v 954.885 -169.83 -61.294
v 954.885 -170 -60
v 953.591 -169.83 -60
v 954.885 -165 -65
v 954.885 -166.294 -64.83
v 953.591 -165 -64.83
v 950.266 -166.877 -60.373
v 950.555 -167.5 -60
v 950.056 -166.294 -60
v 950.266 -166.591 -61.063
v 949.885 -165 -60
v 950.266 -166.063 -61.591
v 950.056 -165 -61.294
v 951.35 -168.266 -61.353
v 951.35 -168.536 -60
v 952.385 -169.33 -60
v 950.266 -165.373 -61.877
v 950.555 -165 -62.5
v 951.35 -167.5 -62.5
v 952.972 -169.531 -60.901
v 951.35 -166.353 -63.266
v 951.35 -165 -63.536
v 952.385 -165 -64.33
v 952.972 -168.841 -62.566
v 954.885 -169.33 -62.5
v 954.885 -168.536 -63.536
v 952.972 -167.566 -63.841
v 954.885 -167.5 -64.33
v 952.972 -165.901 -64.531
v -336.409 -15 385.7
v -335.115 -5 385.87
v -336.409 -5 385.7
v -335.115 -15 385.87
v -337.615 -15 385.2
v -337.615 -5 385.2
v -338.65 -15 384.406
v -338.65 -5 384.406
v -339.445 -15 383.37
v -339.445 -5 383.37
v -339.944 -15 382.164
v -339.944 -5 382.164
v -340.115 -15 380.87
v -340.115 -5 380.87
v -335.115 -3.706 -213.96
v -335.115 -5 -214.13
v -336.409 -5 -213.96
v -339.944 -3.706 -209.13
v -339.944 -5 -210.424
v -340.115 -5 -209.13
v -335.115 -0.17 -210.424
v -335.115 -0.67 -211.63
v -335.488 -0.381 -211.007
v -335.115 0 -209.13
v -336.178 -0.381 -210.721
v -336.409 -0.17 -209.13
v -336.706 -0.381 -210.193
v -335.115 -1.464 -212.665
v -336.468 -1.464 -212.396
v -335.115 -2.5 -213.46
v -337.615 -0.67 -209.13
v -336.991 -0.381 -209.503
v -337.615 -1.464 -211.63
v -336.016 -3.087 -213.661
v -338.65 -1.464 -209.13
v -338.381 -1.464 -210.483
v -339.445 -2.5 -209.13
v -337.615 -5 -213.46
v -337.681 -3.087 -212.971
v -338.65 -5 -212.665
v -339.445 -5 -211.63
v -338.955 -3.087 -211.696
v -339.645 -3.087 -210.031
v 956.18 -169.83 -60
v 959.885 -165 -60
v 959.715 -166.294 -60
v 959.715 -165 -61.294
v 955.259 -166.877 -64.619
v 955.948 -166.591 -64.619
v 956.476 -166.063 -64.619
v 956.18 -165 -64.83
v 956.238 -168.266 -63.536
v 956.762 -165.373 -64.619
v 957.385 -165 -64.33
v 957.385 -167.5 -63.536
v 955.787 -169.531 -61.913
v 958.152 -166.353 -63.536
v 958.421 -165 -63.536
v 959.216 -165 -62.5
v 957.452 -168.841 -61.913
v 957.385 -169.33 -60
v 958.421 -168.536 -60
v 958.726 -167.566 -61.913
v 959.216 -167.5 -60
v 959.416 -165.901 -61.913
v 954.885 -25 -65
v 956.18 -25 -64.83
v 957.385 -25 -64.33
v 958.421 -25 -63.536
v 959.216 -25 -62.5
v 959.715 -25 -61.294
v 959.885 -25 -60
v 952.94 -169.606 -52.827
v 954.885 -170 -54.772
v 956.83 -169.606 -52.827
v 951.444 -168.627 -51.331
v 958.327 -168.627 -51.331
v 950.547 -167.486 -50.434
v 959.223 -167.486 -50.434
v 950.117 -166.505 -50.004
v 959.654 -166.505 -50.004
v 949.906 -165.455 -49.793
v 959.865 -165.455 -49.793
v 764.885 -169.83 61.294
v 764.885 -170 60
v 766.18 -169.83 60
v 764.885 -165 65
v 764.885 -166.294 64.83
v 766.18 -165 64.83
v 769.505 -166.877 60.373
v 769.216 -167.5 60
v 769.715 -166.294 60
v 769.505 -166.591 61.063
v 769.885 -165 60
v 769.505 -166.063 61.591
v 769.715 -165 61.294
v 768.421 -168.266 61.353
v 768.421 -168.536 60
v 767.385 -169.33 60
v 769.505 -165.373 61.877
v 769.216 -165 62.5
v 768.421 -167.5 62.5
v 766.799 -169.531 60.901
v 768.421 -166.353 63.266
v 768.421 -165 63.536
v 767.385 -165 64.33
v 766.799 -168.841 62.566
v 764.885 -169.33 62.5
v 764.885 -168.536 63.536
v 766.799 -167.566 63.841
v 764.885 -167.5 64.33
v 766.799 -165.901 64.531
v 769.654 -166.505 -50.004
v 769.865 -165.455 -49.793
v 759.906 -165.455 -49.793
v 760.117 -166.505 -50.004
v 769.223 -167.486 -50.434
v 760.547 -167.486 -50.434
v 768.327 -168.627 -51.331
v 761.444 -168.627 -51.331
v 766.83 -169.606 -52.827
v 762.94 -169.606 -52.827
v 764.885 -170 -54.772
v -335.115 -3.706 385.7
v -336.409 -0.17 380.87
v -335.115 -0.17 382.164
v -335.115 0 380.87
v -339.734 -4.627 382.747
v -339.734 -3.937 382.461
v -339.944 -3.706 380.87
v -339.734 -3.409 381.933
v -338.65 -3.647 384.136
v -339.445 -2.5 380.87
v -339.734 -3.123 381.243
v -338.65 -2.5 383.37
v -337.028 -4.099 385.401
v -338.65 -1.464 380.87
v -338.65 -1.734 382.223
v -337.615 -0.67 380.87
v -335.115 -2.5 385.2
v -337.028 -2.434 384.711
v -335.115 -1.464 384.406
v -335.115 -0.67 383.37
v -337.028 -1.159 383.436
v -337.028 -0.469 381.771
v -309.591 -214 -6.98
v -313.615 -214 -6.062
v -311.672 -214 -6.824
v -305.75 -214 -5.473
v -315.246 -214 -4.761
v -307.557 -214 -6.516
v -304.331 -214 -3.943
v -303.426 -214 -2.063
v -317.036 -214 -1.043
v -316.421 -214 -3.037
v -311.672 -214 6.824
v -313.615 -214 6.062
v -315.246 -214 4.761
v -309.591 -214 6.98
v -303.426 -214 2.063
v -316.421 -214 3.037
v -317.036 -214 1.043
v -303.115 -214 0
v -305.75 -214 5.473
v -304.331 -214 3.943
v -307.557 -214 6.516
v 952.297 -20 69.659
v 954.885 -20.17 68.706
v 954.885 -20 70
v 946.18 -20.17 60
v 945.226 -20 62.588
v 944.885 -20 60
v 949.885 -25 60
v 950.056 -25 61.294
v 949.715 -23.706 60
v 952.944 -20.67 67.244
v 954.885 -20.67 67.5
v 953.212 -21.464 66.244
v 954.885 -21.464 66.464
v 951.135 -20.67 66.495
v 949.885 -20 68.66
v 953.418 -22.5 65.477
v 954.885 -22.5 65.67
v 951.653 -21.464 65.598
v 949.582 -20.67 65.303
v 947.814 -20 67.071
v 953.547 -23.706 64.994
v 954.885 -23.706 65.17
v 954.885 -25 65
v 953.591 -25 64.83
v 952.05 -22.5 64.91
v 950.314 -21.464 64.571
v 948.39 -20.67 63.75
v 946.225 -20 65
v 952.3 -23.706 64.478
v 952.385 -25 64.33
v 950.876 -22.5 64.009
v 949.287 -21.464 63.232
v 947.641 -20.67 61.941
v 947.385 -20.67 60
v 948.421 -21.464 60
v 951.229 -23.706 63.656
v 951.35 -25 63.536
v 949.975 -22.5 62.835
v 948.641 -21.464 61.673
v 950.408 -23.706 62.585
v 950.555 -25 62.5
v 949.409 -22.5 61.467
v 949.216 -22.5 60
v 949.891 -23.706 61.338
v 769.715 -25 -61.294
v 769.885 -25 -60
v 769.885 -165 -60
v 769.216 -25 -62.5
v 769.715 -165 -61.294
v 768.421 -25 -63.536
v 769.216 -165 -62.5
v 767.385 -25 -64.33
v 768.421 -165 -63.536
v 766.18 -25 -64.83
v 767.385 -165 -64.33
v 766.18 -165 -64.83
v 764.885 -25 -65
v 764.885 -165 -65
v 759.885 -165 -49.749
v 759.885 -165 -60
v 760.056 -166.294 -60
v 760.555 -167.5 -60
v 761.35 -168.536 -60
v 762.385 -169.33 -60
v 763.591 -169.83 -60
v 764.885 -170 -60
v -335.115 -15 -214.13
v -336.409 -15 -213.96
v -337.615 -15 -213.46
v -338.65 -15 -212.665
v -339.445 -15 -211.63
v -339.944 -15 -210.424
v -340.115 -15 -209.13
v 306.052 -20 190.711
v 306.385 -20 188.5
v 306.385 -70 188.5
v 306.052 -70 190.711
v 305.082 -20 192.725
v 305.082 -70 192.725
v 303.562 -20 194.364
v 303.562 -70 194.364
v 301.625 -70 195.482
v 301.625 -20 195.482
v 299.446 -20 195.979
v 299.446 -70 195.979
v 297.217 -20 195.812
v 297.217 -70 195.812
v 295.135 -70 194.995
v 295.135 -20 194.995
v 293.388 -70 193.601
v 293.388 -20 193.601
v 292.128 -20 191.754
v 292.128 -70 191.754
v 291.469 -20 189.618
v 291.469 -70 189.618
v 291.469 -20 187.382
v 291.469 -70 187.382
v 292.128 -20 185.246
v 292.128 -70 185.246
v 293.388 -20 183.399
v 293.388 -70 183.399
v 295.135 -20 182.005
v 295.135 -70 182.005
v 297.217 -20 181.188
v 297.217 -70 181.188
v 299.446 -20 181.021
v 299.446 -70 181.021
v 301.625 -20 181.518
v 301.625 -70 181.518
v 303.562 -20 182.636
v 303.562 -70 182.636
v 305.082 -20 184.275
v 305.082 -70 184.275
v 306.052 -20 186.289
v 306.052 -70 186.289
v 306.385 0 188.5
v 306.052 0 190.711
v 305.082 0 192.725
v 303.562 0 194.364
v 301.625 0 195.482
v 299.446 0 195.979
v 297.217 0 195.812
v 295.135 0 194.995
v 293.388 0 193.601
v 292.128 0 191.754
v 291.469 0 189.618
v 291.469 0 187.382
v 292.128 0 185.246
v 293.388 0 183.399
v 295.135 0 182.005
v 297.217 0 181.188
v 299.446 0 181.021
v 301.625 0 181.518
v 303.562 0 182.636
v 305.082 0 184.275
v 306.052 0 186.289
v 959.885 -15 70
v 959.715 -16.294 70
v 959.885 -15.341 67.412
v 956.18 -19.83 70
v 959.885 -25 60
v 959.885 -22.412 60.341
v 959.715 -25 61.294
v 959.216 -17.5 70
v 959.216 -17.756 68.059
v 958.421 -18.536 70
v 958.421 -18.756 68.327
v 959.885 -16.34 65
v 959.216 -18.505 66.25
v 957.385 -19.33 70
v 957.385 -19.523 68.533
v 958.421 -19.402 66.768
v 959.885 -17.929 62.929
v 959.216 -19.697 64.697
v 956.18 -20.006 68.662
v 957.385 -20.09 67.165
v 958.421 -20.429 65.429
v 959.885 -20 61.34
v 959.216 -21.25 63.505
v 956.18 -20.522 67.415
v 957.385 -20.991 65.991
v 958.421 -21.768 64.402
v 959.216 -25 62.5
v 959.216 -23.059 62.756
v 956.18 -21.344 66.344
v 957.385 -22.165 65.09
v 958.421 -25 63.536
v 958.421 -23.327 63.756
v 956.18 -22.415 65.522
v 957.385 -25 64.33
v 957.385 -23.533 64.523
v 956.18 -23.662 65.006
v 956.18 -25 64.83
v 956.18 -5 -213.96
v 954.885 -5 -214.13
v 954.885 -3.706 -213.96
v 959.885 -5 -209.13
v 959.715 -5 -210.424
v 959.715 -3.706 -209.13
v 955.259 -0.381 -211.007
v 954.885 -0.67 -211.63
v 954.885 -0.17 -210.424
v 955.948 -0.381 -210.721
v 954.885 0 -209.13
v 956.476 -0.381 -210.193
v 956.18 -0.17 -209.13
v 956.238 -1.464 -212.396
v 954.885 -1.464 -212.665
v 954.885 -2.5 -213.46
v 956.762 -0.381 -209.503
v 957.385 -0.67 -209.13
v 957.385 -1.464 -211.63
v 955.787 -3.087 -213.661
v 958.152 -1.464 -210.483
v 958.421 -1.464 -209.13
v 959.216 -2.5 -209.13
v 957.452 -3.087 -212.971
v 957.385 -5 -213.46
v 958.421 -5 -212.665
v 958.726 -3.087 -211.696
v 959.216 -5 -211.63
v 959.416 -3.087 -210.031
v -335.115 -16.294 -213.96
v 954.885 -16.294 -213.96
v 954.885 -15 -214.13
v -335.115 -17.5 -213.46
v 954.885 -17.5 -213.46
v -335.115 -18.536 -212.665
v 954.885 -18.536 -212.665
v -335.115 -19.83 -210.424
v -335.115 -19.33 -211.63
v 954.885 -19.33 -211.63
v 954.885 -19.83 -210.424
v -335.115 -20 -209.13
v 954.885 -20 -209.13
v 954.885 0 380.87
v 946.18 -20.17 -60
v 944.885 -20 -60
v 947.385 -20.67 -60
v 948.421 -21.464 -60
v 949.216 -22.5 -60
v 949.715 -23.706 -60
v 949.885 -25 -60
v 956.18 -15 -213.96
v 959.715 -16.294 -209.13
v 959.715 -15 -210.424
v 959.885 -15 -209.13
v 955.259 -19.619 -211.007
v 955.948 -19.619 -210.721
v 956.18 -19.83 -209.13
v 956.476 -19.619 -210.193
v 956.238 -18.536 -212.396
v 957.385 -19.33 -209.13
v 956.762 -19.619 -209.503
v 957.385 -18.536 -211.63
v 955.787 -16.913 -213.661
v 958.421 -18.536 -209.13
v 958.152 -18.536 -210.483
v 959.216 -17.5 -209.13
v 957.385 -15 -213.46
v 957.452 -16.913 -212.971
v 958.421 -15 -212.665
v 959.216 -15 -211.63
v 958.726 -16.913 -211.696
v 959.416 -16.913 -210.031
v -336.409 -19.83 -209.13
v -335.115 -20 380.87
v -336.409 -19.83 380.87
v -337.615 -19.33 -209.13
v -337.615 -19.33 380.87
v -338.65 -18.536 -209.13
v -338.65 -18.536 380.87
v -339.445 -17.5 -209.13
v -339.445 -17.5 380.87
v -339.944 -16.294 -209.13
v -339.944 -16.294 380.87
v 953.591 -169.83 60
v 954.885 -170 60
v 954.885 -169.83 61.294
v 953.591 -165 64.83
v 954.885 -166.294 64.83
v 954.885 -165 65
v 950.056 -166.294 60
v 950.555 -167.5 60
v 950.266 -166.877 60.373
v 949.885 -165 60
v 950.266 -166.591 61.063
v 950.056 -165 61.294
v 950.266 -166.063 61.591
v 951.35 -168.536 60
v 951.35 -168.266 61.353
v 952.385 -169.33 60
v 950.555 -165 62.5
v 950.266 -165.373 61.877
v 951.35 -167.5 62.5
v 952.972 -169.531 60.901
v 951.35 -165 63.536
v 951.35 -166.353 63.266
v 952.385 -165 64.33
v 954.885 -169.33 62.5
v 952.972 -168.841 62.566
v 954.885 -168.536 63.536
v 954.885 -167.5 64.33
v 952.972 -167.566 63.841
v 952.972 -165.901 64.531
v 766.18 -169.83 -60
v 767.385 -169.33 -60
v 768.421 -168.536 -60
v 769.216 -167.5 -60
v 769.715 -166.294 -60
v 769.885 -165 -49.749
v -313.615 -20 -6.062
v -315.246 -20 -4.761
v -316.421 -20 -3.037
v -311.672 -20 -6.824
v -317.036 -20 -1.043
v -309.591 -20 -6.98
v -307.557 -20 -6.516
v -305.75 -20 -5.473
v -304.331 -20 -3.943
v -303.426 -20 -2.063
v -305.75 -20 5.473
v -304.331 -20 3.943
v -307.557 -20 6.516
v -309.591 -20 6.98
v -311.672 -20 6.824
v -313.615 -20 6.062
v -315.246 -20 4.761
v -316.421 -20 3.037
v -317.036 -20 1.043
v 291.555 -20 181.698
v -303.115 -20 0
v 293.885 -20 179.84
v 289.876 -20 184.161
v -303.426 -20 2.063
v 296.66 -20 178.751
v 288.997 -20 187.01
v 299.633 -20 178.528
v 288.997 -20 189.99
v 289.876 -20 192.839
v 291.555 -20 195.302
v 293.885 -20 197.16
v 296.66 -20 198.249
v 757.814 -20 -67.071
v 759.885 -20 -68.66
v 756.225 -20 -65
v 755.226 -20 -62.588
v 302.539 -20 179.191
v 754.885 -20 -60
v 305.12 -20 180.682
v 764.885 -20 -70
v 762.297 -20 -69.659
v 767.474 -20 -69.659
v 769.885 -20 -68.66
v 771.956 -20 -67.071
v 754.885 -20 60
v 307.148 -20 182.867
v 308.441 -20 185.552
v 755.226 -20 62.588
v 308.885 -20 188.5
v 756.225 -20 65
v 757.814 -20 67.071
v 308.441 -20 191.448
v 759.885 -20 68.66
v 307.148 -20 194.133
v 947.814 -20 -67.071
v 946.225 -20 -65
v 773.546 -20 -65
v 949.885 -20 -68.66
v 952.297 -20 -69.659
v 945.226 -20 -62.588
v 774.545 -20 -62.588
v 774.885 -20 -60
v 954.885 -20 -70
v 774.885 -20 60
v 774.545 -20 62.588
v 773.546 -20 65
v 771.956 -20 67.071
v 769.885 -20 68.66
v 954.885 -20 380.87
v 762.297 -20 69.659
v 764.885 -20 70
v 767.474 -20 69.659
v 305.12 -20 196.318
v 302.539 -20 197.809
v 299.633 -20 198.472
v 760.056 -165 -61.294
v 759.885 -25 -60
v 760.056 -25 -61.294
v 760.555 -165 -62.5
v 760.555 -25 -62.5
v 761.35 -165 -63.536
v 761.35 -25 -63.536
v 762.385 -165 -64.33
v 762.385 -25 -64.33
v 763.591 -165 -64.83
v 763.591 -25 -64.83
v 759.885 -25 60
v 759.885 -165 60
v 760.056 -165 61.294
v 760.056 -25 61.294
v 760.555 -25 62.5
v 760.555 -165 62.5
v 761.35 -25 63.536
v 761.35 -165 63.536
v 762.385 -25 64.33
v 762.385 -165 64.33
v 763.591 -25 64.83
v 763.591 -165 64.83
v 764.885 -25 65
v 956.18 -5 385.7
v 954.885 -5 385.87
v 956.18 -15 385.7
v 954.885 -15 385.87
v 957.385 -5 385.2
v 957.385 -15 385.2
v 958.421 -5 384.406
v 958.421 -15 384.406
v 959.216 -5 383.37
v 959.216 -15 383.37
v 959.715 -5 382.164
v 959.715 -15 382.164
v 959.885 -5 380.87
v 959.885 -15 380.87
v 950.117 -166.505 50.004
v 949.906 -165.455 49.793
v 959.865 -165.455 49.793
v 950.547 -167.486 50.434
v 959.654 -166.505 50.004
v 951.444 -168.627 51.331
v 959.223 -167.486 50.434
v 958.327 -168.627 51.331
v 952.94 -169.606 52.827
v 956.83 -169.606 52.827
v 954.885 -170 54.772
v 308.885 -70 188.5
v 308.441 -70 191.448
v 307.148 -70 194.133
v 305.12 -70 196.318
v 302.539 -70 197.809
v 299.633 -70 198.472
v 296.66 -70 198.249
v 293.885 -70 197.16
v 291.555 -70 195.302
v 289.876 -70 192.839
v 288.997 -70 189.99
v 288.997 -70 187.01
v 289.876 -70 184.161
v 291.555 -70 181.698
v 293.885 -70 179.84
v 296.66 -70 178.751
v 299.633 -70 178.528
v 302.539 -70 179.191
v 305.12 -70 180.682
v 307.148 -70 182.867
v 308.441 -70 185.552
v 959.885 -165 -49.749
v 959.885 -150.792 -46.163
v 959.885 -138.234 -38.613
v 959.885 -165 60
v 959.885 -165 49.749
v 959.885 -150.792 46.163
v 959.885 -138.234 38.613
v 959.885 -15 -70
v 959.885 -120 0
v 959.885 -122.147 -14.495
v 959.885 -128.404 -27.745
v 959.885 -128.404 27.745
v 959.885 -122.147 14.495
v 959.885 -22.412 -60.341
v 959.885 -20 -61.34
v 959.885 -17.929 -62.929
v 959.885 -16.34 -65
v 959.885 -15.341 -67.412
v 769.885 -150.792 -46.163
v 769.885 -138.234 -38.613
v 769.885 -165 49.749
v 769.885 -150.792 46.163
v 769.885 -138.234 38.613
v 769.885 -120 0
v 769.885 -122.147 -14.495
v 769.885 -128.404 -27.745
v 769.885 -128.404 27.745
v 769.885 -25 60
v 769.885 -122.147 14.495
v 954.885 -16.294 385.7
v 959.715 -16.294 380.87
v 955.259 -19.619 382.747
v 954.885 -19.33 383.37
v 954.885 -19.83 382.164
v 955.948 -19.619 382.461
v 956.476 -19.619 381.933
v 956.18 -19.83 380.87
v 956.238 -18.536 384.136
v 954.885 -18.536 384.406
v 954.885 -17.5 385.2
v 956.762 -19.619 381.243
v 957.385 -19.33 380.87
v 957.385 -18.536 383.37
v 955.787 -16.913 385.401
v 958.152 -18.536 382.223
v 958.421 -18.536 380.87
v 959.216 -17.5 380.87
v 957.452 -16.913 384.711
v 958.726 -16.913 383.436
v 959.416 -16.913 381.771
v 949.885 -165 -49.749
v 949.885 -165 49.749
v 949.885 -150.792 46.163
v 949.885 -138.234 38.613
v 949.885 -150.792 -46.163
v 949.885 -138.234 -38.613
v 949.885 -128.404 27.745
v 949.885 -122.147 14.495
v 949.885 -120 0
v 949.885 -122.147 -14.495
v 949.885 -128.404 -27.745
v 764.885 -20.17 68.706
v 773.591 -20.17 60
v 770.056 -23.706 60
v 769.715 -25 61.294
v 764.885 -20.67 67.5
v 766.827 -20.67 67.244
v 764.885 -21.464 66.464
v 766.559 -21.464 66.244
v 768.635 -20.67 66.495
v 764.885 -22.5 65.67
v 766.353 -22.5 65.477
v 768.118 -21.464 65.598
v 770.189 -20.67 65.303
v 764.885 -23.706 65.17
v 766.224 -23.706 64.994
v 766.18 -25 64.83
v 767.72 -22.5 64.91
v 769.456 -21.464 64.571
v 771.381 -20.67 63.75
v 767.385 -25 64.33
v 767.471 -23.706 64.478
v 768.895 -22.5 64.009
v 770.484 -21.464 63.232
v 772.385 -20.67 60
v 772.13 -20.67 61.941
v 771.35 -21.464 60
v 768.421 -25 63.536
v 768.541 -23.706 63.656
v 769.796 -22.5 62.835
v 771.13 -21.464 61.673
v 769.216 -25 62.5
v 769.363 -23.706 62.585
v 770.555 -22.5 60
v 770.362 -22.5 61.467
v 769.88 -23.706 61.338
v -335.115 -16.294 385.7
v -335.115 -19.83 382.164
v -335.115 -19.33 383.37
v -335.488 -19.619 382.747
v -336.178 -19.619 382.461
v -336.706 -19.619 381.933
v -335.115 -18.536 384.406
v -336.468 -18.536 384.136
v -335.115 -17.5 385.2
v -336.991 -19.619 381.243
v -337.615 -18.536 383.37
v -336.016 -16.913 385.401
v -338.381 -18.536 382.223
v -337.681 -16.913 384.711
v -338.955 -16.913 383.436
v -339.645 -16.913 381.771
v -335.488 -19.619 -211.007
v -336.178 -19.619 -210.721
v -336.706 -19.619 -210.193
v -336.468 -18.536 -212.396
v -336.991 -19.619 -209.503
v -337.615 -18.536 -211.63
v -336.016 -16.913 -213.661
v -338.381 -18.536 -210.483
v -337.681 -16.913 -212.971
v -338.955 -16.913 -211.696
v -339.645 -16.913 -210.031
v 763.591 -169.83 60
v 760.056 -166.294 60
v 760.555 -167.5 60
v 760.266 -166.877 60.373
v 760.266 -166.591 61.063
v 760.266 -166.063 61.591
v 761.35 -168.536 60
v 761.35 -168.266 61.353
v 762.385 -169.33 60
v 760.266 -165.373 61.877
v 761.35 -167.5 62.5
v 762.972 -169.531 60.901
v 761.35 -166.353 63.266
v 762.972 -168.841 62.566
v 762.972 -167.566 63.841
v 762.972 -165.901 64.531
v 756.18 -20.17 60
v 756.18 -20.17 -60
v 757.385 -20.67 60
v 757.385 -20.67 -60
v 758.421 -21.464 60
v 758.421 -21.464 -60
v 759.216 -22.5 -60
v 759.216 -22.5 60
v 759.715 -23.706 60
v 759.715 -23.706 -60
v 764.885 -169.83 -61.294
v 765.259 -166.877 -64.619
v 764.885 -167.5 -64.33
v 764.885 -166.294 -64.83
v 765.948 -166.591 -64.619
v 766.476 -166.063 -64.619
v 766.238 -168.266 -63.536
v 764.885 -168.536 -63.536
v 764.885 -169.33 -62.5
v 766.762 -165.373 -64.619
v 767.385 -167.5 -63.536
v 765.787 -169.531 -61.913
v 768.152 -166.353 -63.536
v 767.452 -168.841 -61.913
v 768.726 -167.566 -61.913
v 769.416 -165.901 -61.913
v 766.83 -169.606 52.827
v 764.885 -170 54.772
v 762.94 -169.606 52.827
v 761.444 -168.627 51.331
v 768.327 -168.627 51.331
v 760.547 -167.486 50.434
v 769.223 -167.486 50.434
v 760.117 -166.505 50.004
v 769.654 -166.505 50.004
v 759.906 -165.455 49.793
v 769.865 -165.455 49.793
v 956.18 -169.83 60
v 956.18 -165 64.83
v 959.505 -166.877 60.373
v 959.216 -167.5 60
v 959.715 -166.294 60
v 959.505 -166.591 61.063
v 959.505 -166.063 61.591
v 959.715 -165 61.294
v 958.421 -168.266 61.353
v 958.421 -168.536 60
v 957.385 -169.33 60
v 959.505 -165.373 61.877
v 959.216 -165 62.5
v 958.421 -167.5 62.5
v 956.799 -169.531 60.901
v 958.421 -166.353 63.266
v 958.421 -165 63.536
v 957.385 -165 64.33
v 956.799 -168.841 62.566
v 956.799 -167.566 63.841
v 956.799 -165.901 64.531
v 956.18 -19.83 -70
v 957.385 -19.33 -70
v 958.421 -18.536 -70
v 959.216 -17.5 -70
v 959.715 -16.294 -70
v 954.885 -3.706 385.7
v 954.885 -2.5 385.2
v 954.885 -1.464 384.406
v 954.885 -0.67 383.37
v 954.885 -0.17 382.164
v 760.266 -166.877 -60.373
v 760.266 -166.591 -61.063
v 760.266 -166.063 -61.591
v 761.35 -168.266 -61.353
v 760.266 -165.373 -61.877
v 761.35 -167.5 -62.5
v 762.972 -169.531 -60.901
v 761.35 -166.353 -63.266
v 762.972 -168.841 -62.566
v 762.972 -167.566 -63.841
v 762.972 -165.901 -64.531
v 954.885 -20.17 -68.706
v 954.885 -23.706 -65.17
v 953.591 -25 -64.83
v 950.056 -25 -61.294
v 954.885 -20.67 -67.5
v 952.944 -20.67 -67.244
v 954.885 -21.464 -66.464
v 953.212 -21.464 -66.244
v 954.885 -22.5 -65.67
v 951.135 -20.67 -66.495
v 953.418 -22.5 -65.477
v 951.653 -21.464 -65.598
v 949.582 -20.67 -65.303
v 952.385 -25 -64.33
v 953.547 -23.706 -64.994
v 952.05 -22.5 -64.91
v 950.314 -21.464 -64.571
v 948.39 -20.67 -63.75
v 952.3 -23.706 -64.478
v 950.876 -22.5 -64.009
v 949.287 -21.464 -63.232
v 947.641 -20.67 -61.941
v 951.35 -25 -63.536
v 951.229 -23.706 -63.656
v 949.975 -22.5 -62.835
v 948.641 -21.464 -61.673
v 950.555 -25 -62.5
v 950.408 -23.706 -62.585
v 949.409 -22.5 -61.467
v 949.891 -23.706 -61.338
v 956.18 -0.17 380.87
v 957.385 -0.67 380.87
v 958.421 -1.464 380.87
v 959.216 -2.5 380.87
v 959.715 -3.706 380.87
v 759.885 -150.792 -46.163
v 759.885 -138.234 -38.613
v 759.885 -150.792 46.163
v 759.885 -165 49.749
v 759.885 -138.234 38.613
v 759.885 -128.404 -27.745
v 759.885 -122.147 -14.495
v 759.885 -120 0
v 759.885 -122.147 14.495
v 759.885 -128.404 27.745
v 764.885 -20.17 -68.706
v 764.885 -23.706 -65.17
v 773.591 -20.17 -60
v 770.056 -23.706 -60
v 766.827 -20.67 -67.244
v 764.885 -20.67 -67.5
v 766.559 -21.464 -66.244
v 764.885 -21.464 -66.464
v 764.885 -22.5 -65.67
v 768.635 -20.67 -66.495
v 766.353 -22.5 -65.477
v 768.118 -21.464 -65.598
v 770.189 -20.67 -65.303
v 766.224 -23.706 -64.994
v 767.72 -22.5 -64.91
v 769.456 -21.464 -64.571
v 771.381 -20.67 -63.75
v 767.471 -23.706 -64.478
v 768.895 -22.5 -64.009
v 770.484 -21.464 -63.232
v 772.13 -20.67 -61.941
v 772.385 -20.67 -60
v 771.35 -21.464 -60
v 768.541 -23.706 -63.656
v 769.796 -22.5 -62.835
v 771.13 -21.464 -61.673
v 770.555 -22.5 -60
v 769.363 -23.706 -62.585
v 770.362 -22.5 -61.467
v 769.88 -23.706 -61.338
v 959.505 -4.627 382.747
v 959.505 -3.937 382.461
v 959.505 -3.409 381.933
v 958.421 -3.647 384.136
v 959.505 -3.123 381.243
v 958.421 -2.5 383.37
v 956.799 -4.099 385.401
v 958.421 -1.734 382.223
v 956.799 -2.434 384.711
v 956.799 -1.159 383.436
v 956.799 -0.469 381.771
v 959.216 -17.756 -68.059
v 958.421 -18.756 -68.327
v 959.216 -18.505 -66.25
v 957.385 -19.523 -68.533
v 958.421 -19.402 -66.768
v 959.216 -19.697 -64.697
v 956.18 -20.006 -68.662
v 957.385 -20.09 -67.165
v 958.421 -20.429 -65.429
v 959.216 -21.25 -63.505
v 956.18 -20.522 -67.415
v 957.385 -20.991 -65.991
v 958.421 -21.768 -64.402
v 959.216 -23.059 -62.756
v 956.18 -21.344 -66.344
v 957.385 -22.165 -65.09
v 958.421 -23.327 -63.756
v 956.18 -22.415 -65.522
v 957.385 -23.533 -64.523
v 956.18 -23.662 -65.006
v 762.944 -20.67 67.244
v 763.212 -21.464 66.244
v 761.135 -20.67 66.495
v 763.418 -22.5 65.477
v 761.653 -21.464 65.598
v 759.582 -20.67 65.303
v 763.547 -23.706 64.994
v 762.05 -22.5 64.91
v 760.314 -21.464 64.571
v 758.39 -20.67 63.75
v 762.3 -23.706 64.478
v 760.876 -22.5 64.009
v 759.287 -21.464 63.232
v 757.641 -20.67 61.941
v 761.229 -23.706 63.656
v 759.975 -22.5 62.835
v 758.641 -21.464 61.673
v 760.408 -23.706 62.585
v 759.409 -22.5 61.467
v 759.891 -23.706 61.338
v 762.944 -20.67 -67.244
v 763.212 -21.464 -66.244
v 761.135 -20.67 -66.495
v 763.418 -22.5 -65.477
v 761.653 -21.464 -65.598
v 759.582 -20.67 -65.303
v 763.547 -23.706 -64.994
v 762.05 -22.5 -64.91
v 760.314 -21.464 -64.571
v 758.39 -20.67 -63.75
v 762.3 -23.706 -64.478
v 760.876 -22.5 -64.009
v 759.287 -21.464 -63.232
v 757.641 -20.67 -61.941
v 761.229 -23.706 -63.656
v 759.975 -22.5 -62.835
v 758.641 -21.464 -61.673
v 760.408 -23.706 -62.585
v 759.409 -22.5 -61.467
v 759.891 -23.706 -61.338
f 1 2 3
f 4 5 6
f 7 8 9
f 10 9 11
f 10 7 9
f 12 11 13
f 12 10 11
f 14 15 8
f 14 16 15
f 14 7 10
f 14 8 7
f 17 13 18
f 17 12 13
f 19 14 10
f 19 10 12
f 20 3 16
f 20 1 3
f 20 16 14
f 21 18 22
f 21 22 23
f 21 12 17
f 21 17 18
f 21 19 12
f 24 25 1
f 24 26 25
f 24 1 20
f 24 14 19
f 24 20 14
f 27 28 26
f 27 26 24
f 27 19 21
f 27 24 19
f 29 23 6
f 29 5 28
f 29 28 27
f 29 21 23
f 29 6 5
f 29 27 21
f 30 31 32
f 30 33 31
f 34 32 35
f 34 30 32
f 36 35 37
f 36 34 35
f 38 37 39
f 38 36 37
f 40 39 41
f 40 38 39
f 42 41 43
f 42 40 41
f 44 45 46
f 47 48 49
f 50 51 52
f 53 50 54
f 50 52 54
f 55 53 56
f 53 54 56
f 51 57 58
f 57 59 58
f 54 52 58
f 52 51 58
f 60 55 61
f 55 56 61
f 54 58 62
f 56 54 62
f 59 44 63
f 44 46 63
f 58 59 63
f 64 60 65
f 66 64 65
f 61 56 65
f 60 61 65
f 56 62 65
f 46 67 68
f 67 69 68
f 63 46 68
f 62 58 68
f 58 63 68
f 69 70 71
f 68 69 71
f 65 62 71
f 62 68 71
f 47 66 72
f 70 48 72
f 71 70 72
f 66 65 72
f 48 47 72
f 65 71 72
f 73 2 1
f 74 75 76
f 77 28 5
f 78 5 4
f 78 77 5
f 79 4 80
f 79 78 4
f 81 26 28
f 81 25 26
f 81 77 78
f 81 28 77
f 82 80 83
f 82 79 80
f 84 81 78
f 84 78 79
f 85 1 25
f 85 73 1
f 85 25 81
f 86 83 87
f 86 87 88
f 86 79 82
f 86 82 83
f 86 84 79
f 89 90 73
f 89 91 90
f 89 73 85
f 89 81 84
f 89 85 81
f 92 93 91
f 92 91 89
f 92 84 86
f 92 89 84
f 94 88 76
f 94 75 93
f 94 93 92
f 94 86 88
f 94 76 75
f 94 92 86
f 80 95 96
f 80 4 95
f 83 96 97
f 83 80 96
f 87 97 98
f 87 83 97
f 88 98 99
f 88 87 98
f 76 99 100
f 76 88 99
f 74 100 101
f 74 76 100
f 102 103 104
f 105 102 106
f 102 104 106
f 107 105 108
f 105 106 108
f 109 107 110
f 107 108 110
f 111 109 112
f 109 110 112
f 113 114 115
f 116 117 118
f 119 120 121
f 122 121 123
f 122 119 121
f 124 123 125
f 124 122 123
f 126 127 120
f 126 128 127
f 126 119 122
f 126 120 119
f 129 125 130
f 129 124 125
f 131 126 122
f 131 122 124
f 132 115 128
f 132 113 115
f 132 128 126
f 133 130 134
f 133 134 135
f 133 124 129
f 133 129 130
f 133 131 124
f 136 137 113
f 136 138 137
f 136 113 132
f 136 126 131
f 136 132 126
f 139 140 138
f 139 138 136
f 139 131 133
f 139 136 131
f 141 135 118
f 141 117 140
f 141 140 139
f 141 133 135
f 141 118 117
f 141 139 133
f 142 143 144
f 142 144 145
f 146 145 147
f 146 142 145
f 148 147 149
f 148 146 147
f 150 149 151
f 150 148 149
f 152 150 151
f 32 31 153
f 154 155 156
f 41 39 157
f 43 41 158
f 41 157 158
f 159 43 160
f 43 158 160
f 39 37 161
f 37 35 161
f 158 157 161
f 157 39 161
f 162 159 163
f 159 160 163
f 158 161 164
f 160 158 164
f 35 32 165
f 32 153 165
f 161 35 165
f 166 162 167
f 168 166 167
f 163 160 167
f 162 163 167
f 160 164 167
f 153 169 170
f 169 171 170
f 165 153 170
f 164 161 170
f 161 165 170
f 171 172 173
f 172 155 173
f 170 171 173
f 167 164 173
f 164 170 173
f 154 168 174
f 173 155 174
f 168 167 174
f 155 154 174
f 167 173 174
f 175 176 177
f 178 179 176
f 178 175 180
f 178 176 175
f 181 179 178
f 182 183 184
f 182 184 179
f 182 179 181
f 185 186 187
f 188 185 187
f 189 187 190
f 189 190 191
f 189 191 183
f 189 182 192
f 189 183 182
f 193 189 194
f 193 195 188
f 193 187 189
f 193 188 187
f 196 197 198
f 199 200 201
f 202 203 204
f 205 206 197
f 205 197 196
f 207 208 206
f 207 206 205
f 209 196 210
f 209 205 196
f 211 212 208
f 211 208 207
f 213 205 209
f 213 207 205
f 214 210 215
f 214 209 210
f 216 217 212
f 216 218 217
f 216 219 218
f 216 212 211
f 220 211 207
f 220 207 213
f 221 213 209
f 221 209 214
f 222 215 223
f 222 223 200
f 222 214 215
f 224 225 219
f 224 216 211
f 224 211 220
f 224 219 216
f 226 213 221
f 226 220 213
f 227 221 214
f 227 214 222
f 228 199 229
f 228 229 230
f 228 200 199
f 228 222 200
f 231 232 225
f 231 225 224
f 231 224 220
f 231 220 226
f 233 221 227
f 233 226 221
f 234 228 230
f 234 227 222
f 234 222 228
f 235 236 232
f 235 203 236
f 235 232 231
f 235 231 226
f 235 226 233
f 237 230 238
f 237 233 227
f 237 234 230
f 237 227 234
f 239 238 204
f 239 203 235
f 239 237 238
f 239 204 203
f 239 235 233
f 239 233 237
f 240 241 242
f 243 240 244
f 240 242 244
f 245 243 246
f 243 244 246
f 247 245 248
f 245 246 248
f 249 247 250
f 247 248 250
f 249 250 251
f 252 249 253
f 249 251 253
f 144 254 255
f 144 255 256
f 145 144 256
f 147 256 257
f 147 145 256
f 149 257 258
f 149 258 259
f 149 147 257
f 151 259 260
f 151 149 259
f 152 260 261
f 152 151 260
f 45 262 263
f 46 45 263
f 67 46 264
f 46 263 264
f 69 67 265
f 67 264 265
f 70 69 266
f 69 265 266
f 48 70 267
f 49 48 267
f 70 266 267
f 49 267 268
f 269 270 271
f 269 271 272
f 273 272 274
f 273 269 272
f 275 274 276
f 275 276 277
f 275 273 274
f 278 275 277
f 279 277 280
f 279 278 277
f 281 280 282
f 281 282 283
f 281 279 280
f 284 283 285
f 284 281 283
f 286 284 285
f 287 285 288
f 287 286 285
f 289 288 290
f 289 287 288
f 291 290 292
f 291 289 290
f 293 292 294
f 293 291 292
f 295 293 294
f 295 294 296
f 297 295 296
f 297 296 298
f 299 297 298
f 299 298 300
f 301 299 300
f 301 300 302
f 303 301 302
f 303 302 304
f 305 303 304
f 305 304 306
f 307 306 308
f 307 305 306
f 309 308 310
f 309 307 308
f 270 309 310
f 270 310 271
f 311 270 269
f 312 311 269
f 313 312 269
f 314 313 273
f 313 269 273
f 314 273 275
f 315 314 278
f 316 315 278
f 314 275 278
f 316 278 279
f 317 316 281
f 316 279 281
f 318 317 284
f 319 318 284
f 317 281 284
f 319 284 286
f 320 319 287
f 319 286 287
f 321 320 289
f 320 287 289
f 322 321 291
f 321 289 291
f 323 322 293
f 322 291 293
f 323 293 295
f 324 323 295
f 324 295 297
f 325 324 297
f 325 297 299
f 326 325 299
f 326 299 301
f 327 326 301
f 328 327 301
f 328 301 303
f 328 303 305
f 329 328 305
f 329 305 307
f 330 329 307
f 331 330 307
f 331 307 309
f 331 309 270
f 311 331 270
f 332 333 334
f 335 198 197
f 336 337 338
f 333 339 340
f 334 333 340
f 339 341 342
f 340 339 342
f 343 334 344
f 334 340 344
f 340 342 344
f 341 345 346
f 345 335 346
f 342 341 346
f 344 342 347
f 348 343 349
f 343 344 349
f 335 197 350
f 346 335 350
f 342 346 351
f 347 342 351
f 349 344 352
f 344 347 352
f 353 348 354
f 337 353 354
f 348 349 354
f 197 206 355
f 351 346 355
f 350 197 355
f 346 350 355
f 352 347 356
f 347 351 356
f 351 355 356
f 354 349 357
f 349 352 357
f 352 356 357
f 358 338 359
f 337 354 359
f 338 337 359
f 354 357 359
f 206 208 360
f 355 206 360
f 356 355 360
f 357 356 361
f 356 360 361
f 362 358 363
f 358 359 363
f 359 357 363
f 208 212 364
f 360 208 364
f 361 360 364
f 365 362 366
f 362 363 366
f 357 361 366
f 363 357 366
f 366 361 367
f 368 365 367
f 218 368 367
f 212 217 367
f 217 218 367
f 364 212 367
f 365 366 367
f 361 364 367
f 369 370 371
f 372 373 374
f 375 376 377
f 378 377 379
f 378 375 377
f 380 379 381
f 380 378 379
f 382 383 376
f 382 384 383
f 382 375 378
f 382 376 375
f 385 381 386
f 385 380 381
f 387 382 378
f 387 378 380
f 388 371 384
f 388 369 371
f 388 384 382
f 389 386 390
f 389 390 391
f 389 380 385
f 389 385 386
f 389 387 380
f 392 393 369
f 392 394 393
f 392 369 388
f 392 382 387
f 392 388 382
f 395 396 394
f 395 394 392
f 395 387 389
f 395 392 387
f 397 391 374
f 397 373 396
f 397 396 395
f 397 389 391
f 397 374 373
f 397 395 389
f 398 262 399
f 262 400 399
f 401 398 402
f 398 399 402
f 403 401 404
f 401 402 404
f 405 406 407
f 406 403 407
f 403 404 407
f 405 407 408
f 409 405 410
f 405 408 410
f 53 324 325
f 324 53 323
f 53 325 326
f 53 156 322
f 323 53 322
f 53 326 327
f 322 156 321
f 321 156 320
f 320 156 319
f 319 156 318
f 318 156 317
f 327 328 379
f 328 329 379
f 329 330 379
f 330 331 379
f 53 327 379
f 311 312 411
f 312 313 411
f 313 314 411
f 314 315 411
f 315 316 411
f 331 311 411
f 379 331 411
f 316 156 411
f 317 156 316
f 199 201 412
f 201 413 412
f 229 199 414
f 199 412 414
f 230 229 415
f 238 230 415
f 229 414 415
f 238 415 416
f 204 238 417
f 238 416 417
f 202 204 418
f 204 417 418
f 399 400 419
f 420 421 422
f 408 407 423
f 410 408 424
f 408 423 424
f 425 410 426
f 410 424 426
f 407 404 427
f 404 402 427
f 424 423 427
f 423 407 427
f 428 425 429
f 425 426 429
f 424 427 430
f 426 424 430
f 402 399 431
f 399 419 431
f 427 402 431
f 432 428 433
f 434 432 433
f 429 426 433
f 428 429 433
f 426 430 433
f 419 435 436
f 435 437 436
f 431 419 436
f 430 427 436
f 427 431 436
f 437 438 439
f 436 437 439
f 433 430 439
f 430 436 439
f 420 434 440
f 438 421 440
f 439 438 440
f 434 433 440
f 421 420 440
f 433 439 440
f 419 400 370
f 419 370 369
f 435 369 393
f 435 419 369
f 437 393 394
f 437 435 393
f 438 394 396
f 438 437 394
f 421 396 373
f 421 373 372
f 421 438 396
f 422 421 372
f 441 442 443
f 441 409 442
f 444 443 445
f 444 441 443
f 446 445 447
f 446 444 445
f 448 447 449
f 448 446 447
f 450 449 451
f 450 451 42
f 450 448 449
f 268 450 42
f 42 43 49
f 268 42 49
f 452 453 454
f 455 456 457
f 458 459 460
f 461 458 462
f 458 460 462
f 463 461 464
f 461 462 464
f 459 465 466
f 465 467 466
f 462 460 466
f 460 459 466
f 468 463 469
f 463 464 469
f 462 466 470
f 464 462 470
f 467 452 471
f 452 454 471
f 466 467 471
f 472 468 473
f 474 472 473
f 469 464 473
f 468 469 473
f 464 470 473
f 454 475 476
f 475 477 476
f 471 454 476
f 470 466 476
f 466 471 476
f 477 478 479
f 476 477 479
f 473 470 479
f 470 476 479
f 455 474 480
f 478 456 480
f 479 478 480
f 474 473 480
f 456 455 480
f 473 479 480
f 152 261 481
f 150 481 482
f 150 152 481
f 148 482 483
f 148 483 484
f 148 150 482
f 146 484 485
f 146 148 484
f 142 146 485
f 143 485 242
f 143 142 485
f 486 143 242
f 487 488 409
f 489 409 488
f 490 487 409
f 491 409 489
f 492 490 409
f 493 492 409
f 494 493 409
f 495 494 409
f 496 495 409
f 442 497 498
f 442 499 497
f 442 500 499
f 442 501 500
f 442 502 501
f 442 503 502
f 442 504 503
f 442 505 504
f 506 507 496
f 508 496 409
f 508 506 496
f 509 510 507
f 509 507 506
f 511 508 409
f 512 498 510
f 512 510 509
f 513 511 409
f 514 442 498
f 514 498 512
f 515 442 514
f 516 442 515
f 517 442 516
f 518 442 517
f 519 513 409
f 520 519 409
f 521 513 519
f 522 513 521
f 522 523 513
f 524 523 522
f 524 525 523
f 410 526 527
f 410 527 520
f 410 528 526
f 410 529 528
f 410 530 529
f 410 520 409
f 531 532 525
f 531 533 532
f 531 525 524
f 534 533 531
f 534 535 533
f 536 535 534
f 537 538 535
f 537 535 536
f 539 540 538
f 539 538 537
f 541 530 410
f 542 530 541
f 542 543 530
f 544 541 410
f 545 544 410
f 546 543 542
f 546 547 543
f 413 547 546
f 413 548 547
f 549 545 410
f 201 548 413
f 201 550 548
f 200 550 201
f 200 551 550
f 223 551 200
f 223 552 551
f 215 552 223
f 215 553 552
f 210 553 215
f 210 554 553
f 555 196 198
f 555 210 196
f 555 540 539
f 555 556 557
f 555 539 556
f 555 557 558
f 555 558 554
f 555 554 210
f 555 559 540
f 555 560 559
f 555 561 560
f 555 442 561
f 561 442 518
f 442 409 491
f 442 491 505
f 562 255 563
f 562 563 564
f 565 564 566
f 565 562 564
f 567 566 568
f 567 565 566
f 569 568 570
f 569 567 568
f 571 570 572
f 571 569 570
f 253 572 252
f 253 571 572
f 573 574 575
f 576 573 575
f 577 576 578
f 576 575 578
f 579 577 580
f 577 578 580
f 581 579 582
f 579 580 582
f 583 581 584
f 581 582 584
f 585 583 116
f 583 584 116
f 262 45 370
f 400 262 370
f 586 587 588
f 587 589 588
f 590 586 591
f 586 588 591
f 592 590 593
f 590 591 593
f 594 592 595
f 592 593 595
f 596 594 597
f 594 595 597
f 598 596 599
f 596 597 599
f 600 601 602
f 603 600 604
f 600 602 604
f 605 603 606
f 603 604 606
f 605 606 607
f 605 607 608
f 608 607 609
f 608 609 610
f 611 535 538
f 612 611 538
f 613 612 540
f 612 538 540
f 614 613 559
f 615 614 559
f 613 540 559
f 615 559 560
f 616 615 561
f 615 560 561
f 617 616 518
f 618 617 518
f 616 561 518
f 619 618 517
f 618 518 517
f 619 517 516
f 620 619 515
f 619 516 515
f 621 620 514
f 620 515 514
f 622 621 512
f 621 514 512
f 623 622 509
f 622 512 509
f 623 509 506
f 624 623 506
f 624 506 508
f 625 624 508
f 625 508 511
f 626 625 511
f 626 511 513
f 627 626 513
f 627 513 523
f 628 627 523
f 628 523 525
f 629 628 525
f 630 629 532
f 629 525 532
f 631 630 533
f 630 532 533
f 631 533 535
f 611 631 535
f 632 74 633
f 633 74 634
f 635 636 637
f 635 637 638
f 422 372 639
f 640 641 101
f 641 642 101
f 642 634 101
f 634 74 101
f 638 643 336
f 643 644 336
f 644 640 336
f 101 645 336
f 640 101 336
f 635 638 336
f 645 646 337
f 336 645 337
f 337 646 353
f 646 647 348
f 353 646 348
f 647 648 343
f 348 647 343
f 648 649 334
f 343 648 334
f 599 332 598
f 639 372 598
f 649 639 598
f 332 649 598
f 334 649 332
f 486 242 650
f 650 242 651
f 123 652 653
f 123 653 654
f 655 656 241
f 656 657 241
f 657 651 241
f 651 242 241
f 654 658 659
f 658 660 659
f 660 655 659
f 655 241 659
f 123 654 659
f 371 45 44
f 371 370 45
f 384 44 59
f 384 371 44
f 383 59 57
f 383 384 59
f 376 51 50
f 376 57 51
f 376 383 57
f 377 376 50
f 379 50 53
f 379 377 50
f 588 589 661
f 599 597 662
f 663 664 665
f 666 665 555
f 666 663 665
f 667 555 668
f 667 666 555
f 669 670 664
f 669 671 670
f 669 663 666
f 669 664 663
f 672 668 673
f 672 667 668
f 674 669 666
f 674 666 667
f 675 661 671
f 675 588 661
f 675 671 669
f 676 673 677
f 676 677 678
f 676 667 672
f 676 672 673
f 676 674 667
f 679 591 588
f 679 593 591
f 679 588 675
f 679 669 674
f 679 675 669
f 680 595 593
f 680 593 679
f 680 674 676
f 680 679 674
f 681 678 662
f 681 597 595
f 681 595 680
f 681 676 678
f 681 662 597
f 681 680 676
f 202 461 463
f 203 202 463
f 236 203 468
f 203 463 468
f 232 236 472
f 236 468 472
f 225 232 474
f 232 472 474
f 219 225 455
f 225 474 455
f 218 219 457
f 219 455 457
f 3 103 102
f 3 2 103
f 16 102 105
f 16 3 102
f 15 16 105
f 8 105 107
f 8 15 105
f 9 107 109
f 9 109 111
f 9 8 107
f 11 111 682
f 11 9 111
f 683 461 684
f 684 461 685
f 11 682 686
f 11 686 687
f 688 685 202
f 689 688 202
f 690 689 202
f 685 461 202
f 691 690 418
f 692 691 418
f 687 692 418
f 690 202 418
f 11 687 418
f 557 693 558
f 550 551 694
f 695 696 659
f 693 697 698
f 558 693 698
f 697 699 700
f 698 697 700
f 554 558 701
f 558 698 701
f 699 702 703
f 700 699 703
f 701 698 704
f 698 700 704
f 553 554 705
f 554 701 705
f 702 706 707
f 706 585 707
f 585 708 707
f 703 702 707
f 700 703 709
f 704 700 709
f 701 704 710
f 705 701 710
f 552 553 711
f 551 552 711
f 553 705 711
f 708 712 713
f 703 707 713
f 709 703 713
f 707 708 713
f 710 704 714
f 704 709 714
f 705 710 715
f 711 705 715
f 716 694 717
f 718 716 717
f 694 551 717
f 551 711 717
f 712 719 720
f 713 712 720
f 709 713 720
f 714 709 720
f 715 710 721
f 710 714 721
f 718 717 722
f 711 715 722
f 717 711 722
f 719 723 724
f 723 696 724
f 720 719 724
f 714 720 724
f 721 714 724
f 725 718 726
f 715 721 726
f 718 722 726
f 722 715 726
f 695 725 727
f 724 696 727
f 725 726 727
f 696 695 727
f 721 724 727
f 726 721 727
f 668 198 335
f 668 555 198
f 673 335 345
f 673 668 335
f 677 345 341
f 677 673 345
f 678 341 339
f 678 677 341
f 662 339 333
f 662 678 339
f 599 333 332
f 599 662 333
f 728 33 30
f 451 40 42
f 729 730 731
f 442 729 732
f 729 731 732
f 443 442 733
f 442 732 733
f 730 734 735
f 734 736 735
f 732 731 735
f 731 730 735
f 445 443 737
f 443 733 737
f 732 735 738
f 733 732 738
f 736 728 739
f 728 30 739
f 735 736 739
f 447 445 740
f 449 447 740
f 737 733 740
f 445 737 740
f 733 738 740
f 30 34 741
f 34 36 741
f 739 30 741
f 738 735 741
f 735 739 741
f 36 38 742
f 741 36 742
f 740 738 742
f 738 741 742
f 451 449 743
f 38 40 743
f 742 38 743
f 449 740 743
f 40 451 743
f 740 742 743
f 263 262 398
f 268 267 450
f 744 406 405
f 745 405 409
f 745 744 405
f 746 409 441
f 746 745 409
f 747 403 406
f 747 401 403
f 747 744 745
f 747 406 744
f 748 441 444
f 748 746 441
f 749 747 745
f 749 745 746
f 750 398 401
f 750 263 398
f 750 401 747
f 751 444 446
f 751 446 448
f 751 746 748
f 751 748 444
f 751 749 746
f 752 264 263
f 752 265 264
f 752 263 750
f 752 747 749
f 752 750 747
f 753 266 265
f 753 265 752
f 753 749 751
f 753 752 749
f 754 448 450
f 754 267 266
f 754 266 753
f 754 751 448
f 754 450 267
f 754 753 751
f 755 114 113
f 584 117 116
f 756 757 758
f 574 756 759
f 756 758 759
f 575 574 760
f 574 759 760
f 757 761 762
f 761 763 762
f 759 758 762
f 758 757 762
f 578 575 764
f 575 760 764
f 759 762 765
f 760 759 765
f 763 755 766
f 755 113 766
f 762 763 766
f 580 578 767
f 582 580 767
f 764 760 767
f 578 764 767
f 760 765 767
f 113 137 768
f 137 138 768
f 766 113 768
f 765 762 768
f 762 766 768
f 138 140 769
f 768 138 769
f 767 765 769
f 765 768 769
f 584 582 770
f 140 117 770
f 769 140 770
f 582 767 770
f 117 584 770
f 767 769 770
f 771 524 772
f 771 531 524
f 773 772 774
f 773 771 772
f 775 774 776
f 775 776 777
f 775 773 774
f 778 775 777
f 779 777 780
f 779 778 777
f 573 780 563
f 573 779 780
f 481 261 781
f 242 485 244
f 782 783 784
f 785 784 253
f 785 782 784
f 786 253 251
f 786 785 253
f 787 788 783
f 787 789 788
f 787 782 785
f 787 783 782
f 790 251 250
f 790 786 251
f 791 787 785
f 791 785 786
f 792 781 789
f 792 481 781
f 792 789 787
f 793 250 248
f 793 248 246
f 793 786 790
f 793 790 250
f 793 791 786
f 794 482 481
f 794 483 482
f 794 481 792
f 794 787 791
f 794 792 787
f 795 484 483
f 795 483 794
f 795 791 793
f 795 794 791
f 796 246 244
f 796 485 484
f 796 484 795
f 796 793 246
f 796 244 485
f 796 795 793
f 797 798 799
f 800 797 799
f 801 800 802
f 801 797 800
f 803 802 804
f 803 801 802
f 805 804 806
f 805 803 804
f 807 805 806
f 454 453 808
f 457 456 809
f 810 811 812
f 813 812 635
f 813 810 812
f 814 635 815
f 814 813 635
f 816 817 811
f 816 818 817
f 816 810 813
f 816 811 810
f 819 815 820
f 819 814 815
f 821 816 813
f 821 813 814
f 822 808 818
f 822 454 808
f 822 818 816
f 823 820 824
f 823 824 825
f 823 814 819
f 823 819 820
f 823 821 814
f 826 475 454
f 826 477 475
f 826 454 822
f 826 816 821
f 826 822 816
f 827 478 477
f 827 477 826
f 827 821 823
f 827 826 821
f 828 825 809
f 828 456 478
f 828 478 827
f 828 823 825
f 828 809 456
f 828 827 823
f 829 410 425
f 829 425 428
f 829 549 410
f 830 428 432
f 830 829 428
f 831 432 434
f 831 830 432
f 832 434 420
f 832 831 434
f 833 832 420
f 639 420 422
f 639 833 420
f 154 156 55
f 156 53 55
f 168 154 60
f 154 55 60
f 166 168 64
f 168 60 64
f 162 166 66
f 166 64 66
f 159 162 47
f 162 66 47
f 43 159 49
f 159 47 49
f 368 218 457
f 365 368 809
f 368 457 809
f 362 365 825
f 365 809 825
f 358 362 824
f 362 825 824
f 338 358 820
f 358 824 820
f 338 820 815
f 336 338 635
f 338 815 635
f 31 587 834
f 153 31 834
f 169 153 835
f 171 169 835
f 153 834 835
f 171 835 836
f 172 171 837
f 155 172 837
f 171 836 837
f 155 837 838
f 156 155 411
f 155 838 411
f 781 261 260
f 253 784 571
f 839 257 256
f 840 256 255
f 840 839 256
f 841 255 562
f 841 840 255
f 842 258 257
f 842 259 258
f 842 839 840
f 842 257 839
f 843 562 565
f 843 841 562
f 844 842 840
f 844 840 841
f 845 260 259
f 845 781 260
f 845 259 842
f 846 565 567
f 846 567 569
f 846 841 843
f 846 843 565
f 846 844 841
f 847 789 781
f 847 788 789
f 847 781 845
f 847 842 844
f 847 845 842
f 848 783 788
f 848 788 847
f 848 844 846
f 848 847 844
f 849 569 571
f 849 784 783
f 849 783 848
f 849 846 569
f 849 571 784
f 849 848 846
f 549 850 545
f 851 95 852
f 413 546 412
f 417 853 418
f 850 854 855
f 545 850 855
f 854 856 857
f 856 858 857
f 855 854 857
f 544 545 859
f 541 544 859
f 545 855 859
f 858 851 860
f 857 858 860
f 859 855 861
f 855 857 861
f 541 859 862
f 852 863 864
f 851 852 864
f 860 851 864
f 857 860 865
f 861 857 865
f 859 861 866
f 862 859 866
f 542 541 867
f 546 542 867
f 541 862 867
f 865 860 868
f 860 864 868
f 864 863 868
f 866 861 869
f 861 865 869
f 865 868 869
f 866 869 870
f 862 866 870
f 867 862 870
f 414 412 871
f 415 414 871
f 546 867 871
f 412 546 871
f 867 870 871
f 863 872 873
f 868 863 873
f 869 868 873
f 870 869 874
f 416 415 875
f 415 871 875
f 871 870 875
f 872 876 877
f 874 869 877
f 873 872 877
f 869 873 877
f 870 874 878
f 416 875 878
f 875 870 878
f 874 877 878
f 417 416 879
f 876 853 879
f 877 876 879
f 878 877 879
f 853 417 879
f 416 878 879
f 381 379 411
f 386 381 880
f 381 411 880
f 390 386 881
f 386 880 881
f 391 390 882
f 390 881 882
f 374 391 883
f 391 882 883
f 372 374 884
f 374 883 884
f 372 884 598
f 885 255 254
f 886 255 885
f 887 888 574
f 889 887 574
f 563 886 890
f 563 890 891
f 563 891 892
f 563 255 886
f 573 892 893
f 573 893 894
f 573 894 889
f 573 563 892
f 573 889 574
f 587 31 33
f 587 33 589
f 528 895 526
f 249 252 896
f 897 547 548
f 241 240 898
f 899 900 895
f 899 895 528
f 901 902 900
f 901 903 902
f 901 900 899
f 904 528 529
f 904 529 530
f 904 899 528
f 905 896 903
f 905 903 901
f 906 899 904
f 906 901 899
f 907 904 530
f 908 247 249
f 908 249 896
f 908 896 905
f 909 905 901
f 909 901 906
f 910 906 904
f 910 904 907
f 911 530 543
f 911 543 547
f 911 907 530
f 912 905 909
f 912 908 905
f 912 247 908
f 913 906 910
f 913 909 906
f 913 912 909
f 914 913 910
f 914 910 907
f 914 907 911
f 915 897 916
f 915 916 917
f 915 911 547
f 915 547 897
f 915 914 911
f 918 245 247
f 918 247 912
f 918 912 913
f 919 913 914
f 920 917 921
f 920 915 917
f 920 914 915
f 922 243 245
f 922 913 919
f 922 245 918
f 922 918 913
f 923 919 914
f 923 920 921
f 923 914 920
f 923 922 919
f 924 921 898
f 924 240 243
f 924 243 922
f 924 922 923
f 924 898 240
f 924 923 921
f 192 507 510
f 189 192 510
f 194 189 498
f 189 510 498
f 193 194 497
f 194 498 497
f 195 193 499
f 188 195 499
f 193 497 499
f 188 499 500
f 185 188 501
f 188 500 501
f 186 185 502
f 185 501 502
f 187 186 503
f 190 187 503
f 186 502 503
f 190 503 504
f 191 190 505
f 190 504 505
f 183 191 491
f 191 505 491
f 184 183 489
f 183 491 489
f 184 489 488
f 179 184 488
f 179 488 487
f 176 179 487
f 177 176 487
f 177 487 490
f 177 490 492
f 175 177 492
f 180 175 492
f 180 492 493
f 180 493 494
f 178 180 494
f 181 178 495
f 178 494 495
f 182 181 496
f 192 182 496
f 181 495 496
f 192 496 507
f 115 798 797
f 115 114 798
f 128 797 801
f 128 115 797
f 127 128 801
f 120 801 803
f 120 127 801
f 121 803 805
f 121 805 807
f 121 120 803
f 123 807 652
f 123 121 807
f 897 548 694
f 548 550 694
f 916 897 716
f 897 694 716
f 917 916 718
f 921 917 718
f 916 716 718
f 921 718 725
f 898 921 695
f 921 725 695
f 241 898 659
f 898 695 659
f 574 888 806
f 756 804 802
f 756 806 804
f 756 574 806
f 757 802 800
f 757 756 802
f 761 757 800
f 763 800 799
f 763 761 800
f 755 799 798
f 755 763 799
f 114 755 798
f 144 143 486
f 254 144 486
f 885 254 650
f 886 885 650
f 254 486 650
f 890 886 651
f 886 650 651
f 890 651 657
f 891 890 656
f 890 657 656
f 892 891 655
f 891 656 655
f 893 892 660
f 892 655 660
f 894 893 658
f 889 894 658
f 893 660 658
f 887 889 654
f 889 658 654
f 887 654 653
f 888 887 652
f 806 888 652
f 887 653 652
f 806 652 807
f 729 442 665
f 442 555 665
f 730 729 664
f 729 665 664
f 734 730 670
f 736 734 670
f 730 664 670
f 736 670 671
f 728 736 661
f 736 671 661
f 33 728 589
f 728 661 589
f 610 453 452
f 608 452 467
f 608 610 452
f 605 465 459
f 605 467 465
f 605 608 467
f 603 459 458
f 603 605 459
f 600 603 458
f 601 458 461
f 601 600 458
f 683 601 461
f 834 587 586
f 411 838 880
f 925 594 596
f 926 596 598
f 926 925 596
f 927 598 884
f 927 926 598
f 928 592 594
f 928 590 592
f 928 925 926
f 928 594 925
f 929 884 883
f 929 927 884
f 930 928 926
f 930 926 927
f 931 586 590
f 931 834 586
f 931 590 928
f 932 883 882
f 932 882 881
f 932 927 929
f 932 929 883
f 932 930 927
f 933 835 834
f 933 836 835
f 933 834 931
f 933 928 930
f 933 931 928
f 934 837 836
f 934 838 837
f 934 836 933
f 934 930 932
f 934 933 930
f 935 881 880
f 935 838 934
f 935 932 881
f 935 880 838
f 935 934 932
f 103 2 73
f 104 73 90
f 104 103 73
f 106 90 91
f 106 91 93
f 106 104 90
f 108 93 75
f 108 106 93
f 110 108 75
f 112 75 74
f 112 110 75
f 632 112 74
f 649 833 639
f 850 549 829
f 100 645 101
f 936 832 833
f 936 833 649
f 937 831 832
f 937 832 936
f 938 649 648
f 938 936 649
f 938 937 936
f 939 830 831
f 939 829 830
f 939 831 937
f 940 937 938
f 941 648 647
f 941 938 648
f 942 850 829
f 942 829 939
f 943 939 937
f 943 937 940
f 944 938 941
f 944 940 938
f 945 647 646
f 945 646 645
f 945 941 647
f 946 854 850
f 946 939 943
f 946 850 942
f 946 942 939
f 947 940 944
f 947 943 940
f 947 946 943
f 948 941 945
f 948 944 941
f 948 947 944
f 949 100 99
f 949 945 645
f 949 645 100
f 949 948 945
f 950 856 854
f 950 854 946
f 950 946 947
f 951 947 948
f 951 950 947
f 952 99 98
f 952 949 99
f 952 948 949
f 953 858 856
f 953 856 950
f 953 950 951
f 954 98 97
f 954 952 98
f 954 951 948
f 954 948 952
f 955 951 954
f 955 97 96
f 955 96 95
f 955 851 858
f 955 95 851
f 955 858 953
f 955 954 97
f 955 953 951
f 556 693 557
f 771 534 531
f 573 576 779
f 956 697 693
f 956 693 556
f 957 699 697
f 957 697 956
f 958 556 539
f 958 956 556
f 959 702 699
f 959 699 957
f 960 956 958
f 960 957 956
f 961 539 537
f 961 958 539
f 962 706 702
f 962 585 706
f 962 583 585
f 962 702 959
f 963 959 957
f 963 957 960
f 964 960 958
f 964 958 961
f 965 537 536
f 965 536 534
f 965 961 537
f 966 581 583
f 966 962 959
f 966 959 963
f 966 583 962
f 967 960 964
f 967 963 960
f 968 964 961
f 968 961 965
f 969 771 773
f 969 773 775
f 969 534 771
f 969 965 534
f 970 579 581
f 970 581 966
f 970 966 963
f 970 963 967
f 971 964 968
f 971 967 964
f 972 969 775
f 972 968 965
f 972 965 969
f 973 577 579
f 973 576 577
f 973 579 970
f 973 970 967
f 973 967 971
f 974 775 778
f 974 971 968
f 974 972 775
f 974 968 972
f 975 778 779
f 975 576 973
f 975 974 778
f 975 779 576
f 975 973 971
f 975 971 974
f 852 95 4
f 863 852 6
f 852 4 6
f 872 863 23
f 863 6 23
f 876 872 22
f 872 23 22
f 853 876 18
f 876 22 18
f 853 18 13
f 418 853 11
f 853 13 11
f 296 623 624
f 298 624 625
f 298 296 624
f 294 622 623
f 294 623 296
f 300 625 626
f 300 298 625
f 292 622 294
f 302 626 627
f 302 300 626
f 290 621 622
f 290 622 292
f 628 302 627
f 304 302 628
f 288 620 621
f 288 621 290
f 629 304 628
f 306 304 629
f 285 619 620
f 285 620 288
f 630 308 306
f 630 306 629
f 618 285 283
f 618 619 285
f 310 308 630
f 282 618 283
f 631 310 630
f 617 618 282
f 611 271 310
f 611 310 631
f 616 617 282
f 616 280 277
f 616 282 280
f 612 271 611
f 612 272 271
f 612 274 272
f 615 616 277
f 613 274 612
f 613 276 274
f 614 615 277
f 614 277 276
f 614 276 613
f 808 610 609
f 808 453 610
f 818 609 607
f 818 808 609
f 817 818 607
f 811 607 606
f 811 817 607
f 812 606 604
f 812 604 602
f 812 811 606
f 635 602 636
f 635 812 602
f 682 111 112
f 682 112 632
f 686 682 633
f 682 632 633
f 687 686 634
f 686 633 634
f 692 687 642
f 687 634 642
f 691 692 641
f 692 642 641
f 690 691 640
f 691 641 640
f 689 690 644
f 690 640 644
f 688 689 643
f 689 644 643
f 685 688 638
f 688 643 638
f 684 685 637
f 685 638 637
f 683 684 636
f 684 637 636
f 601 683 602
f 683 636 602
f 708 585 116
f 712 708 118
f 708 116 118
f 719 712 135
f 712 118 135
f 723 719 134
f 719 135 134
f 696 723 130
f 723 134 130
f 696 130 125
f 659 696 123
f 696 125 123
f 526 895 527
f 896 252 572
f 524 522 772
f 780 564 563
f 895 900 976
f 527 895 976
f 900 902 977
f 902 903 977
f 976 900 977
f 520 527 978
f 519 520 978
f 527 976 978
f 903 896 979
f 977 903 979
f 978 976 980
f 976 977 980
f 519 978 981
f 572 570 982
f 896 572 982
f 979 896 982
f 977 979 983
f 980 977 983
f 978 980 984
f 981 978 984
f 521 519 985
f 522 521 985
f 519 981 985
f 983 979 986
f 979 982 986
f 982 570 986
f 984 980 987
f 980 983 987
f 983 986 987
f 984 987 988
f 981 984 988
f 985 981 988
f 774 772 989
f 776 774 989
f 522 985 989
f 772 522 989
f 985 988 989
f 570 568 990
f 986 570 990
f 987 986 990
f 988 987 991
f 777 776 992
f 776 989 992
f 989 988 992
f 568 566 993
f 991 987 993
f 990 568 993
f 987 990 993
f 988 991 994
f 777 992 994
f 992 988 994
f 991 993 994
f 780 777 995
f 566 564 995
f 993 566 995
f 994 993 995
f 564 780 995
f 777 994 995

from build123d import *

# Parameters (mm, degrees)
F0_W      = 1300
F0_H      = 214.1299426556
F0_H_2    = 385.8700573444
F1_DEPTH  = 20
F2_W      = 5
F2_H      = 130
F3_DEPTH  = 150
F4_R      = 50
F5_DEPTH  = 2015
F6_R      = 4.99999
F7_R      = 7.5
F8_DEPTH  = 20.001
F7_R_2    = 10
F9_DEPTH  = 50
F10_R     = 7
F11_DEPTH = 194


# Not quite as in the source:
# - a fillet or chamfer is up to 0.001 mm smaller than in the source, because OpenCascade refuses the exact size


with BuildPart() as f1:
    # F0 (on Front) → F1 (new body)
    with BuildSketch(Plane.XZ):
        with Locations((309.8854213953, -107.0649713278)):
            Rectangle(F0_W, F0_H)
        with Locations((309.8854213953, 192.9350286722)):
            Rectangle(F0_W, F0_H_2)
    extrude(amount=F1_DEPTH)

    # F2 (on face) → F3 (join)
    with BuildSketch(Plane.XZ.offset(20)):
        Polygon((949.8854213953, 65), (949.8854213953, 0), (949.8854213953, -65), (954.8854213953, -65), (954.8854213953, 65), align=None)
        with Locations((762.3854213953, 0)):
            Rectangle(F2_W, F2_H)
        Polygon((769.8854213953, 65), (764.8854213953, 65), (764.8854213953, -65), (769.8854213953, -65), (769.8854213953, 0), align=None)
        with Locations((957.3854213953, 0)):
            Rectangle(F2_W, F2_H)
    extrude(amount=F3_DEPTH)

    # F4 (on face) → F5 (cut)
    with BuildSketch(Plane.YZ.offset(959.8854213953)):
        with Locations((-170, 0)):
            Circle(F4_R)
    extrude(amount=-F5_DEPTH, mode=Mode.SUBTRACT)

    # F6 (radius 5 in the source; OpenCascade refuses exactly that, so slightly less here)
    f6_edges = [f1.edges().sort_by_distance(p)[0] for p in [
        (764.885421, -170, -50),
        (769.885421, -170, -57.5),
        (764.885421, -170, -65),
        (759.885421, -170, -57.5),
        (764.885421, -170, 65),
        (769.885421, -170, 57.5),
        (764.885421, -170, 50),
        (759.885421, -170, 57.5),
        (759.885421, -95, -65),
        (769.885421, -95, -65),
        (764.885421, -20, -65),
        (769.885421, -95, 65),
        (759.885421, -95, 65),
        (764.885421, -20, 65),
        (954.885421, -170, 65),
        (959.885421, -170, 57.5),
        (954.885421, -170, 50),
        (949.885421, -170, 57.5),
        (954.885421, -170, -50),
        (959.885421, -170, -57.5),
        (954.885421, -170, -65),
        (949.885421, -170, -57.5),
        (949.885421, -95, -65),
        (959.885421, -95, -65),
        (954.885421, -20, -65),
        (959.885421, -95, 65),
        (949.885421, -95, 65),
        (954.885421, -20, 65),
        (309.885421, 0, 385.870057),
        (959.885421, -10, 385.870057),
        (-340.114579, -10, 385.870057),
        (309.885421, -20, 385.870057),
        (-340.114579, -10, -214.129943),
        (959.885421, -10, -214.129943),
        (309.885421, 0, -214.129943),
        (309.885421, -20, -214.129943),
        (959.885421, 0, 85.870057),
        (-340.114579, 0, 85.870057),
        (-340.114579, -20, 85.870057),
        (959.885421, -20, 225.435029),
        (949.885421, -20, 0),
        (959.885421, -20, -139.564971),
        (759.885421, -20, 0),
        (769.885421, -20, 0),
    ]]
    fillet(f6_edges, radius=F6_R)

    # F7 (on face) → F8 (cut, through all)
    with BuildSketch(Plane.XZ.offset(20)):
        with Locations((298.8854213953, 188.5)):
            Circle(F7_R)
    extrude(amount=-F8_DEPTH, mode=Mode.SUBTRACT)

    # F7 (on face) → F9 (join)
    with BuildSketch(Plane.XZ.offset(20)):
        with Locations((298.8854213953, 188.5)):
            Circle(F7_R_2)
        with Locations((298.8854213953, 188.5)):
            Circle(F7_R, mode=Mode.SUBTRACT)
    extrude(amount=F9_DEPTH)

    # F10 (on face) → F11 (join)
    with BuildSketch(Plane.XZ.offset(20)):
        with Locations((-310.1145786047, 0)):
            Circle(F10_R)
    extrude(amount=F11_DEPTH)


solid = f1.part
